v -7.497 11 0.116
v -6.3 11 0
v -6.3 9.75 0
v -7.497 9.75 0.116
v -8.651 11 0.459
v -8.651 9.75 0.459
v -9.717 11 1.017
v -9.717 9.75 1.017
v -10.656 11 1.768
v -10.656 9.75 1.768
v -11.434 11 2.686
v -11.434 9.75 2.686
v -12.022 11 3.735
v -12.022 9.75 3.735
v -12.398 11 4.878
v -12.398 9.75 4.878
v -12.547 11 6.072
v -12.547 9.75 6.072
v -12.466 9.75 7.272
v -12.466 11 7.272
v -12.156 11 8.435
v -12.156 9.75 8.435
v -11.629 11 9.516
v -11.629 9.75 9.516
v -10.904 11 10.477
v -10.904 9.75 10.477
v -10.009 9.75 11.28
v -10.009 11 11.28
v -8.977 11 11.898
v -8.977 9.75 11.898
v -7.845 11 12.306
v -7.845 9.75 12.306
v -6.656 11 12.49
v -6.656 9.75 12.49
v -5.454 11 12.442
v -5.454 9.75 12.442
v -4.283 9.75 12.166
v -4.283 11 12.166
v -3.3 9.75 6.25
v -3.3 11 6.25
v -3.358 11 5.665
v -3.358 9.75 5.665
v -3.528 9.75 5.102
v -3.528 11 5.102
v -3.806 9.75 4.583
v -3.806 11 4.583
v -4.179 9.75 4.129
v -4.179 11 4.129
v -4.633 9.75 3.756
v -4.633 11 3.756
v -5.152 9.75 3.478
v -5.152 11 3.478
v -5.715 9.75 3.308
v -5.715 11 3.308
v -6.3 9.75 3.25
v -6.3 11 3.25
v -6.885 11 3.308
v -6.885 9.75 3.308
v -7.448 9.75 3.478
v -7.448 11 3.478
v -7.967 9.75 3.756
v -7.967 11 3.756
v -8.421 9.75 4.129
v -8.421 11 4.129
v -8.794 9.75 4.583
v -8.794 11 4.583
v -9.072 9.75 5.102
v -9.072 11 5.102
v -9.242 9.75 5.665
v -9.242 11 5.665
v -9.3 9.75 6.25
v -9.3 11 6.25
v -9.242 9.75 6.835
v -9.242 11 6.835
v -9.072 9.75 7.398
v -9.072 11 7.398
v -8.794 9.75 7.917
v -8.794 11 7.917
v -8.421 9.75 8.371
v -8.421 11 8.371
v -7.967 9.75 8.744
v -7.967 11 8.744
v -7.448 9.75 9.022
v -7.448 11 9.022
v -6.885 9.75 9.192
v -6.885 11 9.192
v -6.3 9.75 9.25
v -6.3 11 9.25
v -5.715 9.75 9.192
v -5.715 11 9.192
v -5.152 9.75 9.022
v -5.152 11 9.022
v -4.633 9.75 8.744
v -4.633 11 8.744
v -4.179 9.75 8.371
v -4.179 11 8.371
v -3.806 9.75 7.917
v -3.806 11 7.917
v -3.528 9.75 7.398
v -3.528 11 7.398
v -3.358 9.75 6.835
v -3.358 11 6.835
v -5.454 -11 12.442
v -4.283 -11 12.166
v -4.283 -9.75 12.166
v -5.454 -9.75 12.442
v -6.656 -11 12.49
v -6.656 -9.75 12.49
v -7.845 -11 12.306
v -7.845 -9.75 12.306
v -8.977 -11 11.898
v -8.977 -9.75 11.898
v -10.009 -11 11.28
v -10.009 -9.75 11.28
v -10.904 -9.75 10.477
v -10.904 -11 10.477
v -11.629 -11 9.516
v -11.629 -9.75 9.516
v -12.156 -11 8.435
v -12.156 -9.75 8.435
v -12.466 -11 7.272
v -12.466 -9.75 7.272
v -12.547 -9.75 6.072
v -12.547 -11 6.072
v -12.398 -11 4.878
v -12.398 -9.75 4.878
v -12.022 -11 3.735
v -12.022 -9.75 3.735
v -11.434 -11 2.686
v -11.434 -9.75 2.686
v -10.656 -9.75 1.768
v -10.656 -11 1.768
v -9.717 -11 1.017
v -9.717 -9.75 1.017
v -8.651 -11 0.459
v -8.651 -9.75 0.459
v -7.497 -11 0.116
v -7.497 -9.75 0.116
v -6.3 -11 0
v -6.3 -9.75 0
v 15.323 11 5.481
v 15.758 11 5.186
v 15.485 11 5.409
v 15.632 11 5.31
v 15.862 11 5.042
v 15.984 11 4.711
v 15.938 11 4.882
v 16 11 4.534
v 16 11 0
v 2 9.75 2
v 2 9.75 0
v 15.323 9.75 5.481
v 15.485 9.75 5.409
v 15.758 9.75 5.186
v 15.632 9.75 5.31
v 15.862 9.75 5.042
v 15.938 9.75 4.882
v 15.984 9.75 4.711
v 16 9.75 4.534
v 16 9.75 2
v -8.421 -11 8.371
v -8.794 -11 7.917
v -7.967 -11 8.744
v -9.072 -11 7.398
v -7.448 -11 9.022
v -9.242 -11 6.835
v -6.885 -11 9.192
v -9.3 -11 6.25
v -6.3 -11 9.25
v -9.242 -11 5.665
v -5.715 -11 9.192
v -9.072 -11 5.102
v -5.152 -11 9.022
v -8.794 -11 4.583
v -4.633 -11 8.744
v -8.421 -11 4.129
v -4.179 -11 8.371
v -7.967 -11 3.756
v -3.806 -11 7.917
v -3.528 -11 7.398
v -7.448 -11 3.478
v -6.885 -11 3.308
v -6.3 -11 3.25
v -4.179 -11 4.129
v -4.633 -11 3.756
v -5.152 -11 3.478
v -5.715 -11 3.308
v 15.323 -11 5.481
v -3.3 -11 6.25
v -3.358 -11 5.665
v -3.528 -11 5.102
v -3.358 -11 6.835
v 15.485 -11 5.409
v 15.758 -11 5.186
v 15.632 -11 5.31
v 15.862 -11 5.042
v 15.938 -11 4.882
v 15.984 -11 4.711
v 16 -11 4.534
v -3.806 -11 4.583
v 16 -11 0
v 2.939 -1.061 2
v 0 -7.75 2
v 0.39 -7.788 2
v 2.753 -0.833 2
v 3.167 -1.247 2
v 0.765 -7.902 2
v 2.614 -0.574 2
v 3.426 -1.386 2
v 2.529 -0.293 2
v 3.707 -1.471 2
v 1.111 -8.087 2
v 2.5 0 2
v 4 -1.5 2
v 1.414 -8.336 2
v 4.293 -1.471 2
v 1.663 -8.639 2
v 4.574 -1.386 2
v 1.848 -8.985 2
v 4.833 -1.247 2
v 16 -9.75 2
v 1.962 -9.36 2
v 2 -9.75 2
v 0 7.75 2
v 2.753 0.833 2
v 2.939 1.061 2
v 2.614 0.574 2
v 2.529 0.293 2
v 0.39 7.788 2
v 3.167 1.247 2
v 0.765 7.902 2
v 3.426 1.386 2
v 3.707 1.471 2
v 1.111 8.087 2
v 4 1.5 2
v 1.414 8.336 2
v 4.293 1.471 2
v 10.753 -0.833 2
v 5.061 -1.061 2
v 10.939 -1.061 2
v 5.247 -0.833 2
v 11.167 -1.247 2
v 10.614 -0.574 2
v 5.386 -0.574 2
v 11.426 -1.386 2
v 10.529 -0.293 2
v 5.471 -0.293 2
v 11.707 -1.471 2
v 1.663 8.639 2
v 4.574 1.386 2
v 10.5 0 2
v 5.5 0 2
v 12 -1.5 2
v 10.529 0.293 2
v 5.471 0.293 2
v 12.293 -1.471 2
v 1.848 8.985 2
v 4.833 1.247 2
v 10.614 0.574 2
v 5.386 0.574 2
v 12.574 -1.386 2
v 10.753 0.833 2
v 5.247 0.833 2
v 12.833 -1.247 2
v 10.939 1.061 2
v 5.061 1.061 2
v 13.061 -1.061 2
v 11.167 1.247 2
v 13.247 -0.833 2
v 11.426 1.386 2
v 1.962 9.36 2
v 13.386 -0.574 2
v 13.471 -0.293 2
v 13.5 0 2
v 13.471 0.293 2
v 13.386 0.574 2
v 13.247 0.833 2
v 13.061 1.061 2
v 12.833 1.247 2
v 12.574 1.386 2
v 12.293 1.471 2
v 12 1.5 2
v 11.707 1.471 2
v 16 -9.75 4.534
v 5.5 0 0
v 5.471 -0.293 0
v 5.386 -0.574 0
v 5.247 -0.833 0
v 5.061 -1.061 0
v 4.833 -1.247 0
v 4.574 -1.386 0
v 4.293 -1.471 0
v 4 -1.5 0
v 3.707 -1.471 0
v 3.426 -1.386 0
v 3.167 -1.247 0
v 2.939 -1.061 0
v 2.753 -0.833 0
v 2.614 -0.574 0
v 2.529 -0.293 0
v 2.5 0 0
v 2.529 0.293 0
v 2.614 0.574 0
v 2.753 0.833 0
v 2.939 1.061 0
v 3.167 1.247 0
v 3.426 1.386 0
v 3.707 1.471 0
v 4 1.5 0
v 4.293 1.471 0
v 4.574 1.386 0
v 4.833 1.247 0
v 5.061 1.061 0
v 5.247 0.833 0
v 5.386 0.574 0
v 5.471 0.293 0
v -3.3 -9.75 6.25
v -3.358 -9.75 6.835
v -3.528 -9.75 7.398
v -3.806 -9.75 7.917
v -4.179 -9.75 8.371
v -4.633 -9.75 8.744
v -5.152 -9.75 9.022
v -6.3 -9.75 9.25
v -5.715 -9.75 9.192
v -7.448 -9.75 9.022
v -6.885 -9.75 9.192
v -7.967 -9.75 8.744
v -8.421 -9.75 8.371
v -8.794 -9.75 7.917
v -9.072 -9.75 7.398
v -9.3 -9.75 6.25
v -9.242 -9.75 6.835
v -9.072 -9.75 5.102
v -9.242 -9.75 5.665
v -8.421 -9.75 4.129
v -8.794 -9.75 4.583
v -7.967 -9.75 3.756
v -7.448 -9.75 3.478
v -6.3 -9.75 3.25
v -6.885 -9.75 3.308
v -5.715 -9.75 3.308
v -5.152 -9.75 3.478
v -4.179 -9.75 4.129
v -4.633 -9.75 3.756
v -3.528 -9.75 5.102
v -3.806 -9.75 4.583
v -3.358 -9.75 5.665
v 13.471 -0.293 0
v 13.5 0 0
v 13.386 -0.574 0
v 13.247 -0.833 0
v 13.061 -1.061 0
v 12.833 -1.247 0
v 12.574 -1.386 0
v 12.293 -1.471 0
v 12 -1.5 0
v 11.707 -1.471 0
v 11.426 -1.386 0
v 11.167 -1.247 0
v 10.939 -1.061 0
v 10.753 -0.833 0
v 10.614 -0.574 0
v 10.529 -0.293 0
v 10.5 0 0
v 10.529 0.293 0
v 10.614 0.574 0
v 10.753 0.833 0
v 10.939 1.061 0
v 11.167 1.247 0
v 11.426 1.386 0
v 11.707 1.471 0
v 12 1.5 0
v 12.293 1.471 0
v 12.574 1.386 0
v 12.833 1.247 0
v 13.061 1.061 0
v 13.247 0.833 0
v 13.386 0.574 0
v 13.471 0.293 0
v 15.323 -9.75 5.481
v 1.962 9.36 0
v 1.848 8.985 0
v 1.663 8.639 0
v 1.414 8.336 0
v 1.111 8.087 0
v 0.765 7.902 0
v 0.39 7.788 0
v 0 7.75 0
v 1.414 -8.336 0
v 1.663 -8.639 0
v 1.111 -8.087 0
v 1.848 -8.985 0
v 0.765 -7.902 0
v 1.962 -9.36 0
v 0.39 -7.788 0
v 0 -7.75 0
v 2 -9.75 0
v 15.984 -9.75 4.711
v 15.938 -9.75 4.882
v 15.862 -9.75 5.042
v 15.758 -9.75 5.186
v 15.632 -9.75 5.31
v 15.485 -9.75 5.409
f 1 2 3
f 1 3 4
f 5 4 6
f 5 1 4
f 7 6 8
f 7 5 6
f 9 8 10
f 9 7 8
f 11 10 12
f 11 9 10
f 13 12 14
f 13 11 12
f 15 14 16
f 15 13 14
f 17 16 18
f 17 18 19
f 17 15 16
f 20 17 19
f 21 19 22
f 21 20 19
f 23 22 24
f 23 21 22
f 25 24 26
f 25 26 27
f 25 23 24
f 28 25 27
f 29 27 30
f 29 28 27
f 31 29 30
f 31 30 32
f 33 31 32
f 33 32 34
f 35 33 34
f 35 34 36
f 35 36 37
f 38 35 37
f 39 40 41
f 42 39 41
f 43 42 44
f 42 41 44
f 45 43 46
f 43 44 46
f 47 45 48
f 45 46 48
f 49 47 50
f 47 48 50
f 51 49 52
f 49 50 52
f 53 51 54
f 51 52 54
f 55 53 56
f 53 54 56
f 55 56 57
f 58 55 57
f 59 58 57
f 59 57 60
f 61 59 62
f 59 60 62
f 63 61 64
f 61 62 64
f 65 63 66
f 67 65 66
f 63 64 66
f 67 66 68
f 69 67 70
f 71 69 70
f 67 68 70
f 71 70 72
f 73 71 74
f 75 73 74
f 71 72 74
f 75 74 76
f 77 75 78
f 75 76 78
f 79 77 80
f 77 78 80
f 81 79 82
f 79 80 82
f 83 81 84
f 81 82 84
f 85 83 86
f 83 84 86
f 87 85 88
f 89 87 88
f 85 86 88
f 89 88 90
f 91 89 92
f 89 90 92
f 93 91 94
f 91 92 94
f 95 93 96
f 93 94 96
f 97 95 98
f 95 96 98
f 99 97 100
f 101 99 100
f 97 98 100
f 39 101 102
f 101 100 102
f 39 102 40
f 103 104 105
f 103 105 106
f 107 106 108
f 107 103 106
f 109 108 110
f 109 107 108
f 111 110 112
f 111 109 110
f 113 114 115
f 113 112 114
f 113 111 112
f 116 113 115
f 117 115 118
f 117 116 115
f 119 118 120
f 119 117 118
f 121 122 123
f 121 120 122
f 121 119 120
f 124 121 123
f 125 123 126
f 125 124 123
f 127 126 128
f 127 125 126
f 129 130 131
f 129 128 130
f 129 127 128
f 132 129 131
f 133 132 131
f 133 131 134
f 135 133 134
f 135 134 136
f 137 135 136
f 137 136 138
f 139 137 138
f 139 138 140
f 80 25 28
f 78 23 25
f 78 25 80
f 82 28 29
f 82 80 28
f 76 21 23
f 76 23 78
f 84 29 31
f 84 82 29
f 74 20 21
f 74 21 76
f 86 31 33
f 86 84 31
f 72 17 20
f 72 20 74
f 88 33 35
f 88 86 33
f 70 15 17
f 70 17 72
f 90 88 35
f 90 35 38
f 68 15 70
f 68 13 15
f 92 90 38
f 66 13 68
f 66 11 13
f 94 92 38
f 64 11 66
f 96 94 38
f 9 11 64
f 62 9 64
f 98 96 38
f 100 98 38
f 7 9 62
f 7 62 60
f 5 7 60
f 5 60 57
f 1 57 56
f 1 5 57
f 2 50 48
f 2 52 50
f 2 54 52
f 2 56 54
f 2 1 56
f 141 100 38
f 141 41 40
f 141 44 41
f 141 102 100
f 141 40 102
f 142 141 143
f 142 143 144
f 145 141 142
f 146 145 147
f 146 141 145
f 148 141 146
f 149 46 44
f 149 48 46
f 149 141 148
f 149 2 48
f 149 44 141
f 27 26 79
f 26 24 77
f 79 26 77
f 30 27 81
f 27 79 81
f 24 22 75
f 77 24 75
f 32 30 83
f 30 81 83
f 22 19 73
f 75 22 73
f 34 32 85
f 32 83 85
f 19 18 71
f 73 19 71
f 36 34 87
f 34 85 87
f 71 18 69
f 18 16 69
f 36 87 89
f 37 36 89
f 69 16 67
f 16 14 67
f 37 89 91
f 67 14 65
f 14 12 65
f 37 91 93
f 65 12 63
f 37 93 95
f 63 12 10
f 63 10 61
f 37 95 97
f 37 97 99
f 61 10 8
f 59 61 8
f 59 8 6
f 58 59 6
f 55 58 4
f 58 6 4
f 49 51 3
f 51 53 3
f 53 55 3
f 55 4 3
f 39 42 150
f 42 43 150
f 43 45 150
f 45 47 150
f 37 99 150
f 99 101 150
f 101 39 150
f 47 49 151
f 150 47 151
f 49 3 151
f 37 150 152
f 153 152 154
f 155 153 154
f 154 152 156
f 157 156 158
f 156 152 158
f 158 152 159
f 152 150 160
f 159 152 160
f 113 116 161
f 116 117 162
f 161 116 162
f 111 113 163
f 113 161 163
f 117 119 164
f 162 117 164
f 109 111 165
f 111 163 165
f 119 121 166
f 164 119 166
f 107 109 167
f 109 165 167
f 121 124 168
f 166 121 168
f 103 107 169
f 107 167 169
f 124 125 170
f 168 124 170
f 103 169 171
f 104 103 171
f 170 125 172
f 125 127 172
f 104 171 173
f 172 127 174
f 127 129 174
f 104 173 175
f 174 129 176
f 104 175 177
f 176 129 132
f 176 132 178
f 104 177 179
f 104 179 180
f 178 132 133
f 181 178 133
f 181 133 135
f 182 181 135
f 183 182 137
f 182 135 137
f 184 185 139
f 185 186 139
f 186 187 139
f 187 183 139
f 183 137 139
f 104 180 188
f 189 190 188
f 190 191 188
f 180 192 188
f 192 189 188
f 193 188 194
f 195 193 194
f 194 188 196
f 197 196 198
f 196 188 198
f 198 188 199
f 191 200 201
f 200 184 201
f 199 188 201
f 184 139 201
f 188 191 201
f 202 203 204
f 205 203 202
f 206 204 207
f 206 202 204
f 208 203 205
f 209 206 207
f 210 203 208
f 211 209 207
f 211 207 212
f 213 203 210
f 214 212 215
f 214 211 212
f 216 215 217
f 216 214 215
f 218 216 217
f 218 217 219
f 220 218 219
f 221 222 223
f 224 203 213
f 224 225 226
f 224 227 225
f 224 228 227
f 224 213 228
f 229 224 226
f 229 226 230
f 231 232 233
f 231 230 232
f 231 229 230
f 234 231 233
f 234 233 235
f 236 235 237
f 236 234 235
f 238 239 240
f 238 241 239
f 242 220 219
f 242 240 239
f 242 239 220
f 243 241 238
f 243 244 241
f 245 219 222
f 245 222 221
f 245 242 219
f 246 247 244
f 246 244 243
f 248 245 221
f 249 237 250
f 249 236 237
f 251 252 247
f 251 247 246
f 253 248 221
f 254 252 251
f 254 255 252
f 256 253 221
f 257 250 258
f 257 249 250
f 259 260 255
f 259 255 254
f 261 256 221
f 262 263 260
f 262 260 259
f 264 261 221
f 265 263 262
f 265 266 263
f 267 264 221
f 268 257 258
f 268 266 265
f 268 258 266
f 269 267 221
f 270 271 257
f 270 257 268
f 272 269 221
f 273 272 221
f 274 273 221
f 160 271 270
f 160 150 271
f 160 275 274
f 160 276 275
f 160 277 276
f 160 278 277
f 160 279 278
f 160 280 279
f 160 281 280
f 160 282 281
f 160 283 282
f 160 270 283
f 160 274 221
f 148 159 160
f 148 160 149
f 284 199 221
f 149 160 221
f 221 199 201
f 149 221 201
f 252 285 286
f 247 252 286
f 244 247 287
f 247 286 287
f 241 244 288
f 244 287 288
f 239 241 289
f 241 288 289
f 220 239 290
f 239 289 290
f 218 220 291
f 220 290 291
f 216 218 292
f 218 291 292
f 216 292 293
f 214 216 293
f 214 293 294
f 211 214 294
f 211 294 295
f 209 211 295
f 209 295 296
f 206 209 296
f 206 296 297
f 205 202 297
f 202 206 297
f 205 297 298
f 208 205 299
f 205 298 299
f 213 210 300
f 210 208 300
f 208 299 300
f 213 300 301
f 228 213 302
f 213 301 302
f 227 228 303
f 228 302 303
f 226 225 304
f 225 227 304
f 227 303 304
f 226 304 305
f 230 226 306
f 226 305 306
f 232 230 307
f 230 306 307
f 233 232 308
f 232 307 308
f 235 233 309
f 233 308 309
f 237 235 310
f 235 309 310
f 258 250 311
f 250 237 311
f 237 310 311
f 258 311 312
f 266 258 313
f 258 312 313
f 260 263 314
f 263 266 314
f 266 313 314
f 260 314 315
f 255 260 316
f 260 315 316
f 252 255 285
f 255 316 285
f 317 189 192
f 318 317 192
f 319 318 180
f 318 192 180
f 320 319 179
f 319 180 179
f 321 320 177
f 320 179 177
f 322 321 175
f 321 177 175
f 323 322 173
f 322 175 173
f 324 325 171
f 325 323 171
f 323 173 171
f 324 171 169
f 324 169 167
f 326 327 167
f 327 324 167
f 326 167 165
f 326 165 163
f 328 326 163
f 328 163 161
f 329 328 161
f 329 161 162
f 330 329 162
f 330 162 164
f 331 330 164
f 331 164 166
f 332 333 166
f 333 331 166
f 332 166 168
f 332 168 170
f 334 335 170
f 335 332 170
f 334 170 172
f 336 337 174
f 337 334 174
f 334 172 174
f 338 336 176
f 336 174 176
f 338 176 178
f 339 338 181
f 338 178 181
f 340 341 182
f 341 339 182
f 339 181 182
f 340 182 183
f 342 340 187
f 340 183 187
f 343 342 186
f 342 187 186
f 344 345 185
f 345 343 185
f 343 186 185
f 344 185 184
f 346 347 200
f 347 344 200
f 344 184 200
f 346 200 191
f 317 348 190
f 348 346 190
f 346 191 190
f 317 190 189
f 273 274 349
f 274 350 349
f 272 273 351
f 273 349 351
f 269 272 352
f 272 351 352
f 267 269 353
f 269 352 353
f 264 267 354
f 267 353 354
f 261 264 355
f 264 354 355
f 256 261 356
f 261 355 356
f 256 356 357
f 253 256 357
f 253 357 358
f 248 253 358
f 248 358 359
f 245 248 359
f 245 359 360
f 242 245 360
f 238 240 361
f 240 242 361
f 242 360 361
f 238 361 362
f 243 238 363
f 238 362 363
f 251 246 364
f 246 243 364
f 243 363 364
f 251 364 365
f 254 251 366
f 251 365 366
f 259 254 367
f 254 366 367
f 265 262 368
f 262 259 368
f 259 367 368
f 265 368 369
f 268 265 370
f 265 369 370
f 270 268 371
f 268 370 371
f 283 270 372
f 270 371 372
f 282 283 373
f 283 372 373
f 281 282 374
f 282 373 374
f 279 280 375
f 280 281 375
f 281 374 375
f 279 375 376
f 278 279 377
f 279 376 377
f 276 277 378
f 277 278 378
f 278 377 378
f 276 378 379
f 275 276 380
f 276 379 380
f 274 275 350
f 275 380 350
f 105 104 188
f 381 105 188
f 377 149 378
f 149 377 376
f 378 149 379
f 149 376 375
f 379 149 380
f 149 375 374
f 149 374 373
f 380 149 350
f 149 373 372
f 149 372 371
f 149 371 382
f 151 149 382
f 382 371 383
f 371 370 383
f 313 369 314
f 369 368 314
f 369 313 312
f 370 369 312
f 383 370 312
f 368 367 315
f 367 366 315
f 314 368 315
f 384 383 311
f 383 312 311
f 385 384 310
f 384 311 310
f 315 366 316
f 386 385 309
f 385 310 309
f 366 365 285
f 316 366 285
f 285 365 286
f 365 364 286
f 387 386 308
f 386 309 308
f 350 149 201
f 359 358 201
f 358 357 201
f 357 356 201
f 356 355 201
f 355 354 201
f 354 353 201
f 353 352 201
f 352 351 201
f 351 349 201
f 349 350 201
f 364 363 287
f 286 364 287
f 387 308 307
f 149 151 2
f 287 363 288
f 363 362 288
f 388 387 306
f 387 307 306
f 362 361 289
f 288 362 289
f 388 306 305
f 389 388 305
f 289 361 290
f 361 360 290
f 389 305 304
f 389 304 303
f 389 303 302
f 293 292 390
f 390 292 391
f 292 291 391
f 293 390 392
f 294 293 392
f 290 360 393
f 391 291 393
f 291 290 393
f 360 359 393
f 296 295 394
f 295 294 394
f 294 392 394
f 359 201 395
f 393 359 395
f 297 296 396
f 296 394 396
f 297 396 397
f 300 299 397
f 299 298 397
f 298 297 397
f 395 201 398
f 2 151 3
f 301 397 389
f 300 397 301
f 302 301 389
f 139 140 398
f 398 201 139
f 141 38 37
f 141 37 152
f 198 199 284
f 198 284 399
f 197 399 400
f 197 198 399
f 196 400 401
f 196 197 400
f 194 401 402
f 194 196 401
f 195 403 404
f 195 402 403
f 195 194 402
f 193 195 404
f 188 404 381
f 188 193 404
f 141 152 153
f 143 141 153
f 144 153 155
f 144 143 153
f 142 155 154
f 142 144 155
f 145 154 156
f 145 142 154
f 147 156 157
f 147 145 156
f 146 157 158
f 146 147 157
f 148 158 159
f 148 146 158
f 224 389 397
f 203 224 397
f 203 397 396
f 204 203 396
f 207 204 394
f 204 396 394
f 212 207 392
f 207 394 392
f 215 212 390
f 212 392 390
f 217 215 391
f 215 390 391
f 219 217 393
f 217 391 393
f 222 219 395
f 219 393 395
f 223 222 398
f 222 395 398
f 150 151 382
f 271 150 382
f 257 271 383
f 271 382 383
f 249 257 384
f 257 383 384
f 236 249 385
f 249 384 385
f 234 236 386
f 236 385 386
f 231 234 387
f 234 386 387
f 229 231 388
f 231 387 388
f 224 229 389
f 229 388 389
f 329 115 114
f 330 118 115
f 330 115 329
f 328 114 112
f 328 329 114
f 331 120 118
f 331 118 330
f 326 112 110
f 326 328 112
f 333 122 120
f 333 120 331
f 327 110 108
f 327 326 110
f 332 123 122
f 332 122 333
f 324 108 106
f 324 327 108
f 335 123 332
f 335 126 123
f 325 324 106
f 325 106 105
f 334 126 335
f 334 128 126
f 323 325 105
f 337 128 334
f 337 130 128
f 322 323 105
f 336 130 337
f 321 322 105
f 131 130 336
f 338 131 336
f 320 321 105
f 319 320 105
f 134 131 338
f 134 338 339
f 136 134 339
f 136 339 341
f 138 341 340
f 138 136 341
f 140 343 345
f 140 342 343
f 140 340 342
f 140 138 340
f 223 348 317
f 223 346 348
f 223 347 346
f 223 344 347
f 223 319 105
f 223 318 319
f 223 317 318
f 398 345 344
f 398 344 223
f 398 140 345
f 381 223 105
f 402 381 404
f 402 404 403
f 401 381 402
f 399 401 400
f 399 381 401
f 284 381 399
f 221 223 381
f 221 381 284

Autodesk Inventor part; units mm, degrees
sketch "Sketch_45" plane through (0, 0, 0) normal (0, 0, 1) x (1, 0, 0)
  arc A0 (2, -9.75) -> (0, -7.75) centre (0, -9.75) ccw
  line L0 (2, -9.75) -> (16, -9.75)
  line L1 (16, -9.75) -> (16, 9.75)
  line L2 (16, 9.75) -> (2, 9.75)
  arc A1 (0, 7.75) -> (2, 9.75) centre (0, 9.75) ccw
  line L3 (0, 7.75) -> (0, -7.75)
  circle A2 centre (12, 0) radius 1.5
  circle A3 centre (4, 0) radius 1.5
extrude "Extrusion1" add sketch "Sketch_45" along normal blind 2
sketch "Sketch_47" plane through (0, 11, 0) normal (0, 1, 0) x (1, 0, 0)
  arc A0 (-6.3, 0) -> (-4.283, -12.1656) centre (-6.3, -6.25) ccw
  line L0 (-4.283, -12.1656) -> (15.3227, -5.4809)
  arc A1 (15.3227, -5.4809) -> (16, -4.5344) centre (15, -4.5344) ccw
  line L1 (16, -4.5344) -> (16, 0)
  line L2 (16, 0) -> (-6.3, 0)
  circle A2 centre (-6.3, -6.25) radius 3
extrude "Extrusion2" add sketch "Sketch_47" against normal blind 1.25
sketch "Sketch_76" plane through (0, -11, 0) normal (0, 1, 0) x (1, 0, 0)
  arc A0 (-6.3, 0) -> (-4.283, -12.1656) centre (-6.3, -6.25) ccw
  line L0 (-4.283, -12.1656) -> (15.3227, -5.4809)
  arc A1 (15.3227, -5.4809) -> (16, -4.5344) centre (15, -4.5344) ccw
  line L1 (16, -4.5344) -> (16, 0)
  line L2 (16, 0) -> (-6.3, 0)
  circle A2 centre (-6.3, -6.25) radius 3
extrude "Extrusion3" add sketch "Sketch_76" along normal blind 1.25
ref_plane "end_2_XY" through (-6.3, 10.5, 6.25) normal (0, 1, 0) x (1, 0, 0)
ref_plane "end_2_YZ" through (-6.3, 10.5, 6.25) normal (1, 0, 0) x (0, 0, -1)
ref_plane "end_2_ZX" through (-6.3, 10.5, 6.25) normal (0, 0, -1) x (0, 1, 0)
ref_plane "end_move_XY" through (-6.3, -11.5, 6.25) normal (0, -1, 0) x (1, 0, 0)
ref_plane "end_move_YZ" through (-6.3, -11.5, 6.25) normal (1, 0, 0) x (0, 0, 1)
ref_plane "end_move_ZX" through (-6.3, -11.5, 6.25) normal (0, 0, 1) x (0, -1, 0)
ref_plane "to_dummy_XY" through (0, 0, 0) normal (0, 0, 1) x (1, 0, 0)
ref_plane "to_dummy_YZ" through (0, 0, 0) normal (1, 0, 0) x (0, 1, 0)
ref_plane "to_dummy_ZX" through (0, 0, 0) normal (0, 1, 0) x (0, 0, 1)
properties part number "045-16-1_se08f"
